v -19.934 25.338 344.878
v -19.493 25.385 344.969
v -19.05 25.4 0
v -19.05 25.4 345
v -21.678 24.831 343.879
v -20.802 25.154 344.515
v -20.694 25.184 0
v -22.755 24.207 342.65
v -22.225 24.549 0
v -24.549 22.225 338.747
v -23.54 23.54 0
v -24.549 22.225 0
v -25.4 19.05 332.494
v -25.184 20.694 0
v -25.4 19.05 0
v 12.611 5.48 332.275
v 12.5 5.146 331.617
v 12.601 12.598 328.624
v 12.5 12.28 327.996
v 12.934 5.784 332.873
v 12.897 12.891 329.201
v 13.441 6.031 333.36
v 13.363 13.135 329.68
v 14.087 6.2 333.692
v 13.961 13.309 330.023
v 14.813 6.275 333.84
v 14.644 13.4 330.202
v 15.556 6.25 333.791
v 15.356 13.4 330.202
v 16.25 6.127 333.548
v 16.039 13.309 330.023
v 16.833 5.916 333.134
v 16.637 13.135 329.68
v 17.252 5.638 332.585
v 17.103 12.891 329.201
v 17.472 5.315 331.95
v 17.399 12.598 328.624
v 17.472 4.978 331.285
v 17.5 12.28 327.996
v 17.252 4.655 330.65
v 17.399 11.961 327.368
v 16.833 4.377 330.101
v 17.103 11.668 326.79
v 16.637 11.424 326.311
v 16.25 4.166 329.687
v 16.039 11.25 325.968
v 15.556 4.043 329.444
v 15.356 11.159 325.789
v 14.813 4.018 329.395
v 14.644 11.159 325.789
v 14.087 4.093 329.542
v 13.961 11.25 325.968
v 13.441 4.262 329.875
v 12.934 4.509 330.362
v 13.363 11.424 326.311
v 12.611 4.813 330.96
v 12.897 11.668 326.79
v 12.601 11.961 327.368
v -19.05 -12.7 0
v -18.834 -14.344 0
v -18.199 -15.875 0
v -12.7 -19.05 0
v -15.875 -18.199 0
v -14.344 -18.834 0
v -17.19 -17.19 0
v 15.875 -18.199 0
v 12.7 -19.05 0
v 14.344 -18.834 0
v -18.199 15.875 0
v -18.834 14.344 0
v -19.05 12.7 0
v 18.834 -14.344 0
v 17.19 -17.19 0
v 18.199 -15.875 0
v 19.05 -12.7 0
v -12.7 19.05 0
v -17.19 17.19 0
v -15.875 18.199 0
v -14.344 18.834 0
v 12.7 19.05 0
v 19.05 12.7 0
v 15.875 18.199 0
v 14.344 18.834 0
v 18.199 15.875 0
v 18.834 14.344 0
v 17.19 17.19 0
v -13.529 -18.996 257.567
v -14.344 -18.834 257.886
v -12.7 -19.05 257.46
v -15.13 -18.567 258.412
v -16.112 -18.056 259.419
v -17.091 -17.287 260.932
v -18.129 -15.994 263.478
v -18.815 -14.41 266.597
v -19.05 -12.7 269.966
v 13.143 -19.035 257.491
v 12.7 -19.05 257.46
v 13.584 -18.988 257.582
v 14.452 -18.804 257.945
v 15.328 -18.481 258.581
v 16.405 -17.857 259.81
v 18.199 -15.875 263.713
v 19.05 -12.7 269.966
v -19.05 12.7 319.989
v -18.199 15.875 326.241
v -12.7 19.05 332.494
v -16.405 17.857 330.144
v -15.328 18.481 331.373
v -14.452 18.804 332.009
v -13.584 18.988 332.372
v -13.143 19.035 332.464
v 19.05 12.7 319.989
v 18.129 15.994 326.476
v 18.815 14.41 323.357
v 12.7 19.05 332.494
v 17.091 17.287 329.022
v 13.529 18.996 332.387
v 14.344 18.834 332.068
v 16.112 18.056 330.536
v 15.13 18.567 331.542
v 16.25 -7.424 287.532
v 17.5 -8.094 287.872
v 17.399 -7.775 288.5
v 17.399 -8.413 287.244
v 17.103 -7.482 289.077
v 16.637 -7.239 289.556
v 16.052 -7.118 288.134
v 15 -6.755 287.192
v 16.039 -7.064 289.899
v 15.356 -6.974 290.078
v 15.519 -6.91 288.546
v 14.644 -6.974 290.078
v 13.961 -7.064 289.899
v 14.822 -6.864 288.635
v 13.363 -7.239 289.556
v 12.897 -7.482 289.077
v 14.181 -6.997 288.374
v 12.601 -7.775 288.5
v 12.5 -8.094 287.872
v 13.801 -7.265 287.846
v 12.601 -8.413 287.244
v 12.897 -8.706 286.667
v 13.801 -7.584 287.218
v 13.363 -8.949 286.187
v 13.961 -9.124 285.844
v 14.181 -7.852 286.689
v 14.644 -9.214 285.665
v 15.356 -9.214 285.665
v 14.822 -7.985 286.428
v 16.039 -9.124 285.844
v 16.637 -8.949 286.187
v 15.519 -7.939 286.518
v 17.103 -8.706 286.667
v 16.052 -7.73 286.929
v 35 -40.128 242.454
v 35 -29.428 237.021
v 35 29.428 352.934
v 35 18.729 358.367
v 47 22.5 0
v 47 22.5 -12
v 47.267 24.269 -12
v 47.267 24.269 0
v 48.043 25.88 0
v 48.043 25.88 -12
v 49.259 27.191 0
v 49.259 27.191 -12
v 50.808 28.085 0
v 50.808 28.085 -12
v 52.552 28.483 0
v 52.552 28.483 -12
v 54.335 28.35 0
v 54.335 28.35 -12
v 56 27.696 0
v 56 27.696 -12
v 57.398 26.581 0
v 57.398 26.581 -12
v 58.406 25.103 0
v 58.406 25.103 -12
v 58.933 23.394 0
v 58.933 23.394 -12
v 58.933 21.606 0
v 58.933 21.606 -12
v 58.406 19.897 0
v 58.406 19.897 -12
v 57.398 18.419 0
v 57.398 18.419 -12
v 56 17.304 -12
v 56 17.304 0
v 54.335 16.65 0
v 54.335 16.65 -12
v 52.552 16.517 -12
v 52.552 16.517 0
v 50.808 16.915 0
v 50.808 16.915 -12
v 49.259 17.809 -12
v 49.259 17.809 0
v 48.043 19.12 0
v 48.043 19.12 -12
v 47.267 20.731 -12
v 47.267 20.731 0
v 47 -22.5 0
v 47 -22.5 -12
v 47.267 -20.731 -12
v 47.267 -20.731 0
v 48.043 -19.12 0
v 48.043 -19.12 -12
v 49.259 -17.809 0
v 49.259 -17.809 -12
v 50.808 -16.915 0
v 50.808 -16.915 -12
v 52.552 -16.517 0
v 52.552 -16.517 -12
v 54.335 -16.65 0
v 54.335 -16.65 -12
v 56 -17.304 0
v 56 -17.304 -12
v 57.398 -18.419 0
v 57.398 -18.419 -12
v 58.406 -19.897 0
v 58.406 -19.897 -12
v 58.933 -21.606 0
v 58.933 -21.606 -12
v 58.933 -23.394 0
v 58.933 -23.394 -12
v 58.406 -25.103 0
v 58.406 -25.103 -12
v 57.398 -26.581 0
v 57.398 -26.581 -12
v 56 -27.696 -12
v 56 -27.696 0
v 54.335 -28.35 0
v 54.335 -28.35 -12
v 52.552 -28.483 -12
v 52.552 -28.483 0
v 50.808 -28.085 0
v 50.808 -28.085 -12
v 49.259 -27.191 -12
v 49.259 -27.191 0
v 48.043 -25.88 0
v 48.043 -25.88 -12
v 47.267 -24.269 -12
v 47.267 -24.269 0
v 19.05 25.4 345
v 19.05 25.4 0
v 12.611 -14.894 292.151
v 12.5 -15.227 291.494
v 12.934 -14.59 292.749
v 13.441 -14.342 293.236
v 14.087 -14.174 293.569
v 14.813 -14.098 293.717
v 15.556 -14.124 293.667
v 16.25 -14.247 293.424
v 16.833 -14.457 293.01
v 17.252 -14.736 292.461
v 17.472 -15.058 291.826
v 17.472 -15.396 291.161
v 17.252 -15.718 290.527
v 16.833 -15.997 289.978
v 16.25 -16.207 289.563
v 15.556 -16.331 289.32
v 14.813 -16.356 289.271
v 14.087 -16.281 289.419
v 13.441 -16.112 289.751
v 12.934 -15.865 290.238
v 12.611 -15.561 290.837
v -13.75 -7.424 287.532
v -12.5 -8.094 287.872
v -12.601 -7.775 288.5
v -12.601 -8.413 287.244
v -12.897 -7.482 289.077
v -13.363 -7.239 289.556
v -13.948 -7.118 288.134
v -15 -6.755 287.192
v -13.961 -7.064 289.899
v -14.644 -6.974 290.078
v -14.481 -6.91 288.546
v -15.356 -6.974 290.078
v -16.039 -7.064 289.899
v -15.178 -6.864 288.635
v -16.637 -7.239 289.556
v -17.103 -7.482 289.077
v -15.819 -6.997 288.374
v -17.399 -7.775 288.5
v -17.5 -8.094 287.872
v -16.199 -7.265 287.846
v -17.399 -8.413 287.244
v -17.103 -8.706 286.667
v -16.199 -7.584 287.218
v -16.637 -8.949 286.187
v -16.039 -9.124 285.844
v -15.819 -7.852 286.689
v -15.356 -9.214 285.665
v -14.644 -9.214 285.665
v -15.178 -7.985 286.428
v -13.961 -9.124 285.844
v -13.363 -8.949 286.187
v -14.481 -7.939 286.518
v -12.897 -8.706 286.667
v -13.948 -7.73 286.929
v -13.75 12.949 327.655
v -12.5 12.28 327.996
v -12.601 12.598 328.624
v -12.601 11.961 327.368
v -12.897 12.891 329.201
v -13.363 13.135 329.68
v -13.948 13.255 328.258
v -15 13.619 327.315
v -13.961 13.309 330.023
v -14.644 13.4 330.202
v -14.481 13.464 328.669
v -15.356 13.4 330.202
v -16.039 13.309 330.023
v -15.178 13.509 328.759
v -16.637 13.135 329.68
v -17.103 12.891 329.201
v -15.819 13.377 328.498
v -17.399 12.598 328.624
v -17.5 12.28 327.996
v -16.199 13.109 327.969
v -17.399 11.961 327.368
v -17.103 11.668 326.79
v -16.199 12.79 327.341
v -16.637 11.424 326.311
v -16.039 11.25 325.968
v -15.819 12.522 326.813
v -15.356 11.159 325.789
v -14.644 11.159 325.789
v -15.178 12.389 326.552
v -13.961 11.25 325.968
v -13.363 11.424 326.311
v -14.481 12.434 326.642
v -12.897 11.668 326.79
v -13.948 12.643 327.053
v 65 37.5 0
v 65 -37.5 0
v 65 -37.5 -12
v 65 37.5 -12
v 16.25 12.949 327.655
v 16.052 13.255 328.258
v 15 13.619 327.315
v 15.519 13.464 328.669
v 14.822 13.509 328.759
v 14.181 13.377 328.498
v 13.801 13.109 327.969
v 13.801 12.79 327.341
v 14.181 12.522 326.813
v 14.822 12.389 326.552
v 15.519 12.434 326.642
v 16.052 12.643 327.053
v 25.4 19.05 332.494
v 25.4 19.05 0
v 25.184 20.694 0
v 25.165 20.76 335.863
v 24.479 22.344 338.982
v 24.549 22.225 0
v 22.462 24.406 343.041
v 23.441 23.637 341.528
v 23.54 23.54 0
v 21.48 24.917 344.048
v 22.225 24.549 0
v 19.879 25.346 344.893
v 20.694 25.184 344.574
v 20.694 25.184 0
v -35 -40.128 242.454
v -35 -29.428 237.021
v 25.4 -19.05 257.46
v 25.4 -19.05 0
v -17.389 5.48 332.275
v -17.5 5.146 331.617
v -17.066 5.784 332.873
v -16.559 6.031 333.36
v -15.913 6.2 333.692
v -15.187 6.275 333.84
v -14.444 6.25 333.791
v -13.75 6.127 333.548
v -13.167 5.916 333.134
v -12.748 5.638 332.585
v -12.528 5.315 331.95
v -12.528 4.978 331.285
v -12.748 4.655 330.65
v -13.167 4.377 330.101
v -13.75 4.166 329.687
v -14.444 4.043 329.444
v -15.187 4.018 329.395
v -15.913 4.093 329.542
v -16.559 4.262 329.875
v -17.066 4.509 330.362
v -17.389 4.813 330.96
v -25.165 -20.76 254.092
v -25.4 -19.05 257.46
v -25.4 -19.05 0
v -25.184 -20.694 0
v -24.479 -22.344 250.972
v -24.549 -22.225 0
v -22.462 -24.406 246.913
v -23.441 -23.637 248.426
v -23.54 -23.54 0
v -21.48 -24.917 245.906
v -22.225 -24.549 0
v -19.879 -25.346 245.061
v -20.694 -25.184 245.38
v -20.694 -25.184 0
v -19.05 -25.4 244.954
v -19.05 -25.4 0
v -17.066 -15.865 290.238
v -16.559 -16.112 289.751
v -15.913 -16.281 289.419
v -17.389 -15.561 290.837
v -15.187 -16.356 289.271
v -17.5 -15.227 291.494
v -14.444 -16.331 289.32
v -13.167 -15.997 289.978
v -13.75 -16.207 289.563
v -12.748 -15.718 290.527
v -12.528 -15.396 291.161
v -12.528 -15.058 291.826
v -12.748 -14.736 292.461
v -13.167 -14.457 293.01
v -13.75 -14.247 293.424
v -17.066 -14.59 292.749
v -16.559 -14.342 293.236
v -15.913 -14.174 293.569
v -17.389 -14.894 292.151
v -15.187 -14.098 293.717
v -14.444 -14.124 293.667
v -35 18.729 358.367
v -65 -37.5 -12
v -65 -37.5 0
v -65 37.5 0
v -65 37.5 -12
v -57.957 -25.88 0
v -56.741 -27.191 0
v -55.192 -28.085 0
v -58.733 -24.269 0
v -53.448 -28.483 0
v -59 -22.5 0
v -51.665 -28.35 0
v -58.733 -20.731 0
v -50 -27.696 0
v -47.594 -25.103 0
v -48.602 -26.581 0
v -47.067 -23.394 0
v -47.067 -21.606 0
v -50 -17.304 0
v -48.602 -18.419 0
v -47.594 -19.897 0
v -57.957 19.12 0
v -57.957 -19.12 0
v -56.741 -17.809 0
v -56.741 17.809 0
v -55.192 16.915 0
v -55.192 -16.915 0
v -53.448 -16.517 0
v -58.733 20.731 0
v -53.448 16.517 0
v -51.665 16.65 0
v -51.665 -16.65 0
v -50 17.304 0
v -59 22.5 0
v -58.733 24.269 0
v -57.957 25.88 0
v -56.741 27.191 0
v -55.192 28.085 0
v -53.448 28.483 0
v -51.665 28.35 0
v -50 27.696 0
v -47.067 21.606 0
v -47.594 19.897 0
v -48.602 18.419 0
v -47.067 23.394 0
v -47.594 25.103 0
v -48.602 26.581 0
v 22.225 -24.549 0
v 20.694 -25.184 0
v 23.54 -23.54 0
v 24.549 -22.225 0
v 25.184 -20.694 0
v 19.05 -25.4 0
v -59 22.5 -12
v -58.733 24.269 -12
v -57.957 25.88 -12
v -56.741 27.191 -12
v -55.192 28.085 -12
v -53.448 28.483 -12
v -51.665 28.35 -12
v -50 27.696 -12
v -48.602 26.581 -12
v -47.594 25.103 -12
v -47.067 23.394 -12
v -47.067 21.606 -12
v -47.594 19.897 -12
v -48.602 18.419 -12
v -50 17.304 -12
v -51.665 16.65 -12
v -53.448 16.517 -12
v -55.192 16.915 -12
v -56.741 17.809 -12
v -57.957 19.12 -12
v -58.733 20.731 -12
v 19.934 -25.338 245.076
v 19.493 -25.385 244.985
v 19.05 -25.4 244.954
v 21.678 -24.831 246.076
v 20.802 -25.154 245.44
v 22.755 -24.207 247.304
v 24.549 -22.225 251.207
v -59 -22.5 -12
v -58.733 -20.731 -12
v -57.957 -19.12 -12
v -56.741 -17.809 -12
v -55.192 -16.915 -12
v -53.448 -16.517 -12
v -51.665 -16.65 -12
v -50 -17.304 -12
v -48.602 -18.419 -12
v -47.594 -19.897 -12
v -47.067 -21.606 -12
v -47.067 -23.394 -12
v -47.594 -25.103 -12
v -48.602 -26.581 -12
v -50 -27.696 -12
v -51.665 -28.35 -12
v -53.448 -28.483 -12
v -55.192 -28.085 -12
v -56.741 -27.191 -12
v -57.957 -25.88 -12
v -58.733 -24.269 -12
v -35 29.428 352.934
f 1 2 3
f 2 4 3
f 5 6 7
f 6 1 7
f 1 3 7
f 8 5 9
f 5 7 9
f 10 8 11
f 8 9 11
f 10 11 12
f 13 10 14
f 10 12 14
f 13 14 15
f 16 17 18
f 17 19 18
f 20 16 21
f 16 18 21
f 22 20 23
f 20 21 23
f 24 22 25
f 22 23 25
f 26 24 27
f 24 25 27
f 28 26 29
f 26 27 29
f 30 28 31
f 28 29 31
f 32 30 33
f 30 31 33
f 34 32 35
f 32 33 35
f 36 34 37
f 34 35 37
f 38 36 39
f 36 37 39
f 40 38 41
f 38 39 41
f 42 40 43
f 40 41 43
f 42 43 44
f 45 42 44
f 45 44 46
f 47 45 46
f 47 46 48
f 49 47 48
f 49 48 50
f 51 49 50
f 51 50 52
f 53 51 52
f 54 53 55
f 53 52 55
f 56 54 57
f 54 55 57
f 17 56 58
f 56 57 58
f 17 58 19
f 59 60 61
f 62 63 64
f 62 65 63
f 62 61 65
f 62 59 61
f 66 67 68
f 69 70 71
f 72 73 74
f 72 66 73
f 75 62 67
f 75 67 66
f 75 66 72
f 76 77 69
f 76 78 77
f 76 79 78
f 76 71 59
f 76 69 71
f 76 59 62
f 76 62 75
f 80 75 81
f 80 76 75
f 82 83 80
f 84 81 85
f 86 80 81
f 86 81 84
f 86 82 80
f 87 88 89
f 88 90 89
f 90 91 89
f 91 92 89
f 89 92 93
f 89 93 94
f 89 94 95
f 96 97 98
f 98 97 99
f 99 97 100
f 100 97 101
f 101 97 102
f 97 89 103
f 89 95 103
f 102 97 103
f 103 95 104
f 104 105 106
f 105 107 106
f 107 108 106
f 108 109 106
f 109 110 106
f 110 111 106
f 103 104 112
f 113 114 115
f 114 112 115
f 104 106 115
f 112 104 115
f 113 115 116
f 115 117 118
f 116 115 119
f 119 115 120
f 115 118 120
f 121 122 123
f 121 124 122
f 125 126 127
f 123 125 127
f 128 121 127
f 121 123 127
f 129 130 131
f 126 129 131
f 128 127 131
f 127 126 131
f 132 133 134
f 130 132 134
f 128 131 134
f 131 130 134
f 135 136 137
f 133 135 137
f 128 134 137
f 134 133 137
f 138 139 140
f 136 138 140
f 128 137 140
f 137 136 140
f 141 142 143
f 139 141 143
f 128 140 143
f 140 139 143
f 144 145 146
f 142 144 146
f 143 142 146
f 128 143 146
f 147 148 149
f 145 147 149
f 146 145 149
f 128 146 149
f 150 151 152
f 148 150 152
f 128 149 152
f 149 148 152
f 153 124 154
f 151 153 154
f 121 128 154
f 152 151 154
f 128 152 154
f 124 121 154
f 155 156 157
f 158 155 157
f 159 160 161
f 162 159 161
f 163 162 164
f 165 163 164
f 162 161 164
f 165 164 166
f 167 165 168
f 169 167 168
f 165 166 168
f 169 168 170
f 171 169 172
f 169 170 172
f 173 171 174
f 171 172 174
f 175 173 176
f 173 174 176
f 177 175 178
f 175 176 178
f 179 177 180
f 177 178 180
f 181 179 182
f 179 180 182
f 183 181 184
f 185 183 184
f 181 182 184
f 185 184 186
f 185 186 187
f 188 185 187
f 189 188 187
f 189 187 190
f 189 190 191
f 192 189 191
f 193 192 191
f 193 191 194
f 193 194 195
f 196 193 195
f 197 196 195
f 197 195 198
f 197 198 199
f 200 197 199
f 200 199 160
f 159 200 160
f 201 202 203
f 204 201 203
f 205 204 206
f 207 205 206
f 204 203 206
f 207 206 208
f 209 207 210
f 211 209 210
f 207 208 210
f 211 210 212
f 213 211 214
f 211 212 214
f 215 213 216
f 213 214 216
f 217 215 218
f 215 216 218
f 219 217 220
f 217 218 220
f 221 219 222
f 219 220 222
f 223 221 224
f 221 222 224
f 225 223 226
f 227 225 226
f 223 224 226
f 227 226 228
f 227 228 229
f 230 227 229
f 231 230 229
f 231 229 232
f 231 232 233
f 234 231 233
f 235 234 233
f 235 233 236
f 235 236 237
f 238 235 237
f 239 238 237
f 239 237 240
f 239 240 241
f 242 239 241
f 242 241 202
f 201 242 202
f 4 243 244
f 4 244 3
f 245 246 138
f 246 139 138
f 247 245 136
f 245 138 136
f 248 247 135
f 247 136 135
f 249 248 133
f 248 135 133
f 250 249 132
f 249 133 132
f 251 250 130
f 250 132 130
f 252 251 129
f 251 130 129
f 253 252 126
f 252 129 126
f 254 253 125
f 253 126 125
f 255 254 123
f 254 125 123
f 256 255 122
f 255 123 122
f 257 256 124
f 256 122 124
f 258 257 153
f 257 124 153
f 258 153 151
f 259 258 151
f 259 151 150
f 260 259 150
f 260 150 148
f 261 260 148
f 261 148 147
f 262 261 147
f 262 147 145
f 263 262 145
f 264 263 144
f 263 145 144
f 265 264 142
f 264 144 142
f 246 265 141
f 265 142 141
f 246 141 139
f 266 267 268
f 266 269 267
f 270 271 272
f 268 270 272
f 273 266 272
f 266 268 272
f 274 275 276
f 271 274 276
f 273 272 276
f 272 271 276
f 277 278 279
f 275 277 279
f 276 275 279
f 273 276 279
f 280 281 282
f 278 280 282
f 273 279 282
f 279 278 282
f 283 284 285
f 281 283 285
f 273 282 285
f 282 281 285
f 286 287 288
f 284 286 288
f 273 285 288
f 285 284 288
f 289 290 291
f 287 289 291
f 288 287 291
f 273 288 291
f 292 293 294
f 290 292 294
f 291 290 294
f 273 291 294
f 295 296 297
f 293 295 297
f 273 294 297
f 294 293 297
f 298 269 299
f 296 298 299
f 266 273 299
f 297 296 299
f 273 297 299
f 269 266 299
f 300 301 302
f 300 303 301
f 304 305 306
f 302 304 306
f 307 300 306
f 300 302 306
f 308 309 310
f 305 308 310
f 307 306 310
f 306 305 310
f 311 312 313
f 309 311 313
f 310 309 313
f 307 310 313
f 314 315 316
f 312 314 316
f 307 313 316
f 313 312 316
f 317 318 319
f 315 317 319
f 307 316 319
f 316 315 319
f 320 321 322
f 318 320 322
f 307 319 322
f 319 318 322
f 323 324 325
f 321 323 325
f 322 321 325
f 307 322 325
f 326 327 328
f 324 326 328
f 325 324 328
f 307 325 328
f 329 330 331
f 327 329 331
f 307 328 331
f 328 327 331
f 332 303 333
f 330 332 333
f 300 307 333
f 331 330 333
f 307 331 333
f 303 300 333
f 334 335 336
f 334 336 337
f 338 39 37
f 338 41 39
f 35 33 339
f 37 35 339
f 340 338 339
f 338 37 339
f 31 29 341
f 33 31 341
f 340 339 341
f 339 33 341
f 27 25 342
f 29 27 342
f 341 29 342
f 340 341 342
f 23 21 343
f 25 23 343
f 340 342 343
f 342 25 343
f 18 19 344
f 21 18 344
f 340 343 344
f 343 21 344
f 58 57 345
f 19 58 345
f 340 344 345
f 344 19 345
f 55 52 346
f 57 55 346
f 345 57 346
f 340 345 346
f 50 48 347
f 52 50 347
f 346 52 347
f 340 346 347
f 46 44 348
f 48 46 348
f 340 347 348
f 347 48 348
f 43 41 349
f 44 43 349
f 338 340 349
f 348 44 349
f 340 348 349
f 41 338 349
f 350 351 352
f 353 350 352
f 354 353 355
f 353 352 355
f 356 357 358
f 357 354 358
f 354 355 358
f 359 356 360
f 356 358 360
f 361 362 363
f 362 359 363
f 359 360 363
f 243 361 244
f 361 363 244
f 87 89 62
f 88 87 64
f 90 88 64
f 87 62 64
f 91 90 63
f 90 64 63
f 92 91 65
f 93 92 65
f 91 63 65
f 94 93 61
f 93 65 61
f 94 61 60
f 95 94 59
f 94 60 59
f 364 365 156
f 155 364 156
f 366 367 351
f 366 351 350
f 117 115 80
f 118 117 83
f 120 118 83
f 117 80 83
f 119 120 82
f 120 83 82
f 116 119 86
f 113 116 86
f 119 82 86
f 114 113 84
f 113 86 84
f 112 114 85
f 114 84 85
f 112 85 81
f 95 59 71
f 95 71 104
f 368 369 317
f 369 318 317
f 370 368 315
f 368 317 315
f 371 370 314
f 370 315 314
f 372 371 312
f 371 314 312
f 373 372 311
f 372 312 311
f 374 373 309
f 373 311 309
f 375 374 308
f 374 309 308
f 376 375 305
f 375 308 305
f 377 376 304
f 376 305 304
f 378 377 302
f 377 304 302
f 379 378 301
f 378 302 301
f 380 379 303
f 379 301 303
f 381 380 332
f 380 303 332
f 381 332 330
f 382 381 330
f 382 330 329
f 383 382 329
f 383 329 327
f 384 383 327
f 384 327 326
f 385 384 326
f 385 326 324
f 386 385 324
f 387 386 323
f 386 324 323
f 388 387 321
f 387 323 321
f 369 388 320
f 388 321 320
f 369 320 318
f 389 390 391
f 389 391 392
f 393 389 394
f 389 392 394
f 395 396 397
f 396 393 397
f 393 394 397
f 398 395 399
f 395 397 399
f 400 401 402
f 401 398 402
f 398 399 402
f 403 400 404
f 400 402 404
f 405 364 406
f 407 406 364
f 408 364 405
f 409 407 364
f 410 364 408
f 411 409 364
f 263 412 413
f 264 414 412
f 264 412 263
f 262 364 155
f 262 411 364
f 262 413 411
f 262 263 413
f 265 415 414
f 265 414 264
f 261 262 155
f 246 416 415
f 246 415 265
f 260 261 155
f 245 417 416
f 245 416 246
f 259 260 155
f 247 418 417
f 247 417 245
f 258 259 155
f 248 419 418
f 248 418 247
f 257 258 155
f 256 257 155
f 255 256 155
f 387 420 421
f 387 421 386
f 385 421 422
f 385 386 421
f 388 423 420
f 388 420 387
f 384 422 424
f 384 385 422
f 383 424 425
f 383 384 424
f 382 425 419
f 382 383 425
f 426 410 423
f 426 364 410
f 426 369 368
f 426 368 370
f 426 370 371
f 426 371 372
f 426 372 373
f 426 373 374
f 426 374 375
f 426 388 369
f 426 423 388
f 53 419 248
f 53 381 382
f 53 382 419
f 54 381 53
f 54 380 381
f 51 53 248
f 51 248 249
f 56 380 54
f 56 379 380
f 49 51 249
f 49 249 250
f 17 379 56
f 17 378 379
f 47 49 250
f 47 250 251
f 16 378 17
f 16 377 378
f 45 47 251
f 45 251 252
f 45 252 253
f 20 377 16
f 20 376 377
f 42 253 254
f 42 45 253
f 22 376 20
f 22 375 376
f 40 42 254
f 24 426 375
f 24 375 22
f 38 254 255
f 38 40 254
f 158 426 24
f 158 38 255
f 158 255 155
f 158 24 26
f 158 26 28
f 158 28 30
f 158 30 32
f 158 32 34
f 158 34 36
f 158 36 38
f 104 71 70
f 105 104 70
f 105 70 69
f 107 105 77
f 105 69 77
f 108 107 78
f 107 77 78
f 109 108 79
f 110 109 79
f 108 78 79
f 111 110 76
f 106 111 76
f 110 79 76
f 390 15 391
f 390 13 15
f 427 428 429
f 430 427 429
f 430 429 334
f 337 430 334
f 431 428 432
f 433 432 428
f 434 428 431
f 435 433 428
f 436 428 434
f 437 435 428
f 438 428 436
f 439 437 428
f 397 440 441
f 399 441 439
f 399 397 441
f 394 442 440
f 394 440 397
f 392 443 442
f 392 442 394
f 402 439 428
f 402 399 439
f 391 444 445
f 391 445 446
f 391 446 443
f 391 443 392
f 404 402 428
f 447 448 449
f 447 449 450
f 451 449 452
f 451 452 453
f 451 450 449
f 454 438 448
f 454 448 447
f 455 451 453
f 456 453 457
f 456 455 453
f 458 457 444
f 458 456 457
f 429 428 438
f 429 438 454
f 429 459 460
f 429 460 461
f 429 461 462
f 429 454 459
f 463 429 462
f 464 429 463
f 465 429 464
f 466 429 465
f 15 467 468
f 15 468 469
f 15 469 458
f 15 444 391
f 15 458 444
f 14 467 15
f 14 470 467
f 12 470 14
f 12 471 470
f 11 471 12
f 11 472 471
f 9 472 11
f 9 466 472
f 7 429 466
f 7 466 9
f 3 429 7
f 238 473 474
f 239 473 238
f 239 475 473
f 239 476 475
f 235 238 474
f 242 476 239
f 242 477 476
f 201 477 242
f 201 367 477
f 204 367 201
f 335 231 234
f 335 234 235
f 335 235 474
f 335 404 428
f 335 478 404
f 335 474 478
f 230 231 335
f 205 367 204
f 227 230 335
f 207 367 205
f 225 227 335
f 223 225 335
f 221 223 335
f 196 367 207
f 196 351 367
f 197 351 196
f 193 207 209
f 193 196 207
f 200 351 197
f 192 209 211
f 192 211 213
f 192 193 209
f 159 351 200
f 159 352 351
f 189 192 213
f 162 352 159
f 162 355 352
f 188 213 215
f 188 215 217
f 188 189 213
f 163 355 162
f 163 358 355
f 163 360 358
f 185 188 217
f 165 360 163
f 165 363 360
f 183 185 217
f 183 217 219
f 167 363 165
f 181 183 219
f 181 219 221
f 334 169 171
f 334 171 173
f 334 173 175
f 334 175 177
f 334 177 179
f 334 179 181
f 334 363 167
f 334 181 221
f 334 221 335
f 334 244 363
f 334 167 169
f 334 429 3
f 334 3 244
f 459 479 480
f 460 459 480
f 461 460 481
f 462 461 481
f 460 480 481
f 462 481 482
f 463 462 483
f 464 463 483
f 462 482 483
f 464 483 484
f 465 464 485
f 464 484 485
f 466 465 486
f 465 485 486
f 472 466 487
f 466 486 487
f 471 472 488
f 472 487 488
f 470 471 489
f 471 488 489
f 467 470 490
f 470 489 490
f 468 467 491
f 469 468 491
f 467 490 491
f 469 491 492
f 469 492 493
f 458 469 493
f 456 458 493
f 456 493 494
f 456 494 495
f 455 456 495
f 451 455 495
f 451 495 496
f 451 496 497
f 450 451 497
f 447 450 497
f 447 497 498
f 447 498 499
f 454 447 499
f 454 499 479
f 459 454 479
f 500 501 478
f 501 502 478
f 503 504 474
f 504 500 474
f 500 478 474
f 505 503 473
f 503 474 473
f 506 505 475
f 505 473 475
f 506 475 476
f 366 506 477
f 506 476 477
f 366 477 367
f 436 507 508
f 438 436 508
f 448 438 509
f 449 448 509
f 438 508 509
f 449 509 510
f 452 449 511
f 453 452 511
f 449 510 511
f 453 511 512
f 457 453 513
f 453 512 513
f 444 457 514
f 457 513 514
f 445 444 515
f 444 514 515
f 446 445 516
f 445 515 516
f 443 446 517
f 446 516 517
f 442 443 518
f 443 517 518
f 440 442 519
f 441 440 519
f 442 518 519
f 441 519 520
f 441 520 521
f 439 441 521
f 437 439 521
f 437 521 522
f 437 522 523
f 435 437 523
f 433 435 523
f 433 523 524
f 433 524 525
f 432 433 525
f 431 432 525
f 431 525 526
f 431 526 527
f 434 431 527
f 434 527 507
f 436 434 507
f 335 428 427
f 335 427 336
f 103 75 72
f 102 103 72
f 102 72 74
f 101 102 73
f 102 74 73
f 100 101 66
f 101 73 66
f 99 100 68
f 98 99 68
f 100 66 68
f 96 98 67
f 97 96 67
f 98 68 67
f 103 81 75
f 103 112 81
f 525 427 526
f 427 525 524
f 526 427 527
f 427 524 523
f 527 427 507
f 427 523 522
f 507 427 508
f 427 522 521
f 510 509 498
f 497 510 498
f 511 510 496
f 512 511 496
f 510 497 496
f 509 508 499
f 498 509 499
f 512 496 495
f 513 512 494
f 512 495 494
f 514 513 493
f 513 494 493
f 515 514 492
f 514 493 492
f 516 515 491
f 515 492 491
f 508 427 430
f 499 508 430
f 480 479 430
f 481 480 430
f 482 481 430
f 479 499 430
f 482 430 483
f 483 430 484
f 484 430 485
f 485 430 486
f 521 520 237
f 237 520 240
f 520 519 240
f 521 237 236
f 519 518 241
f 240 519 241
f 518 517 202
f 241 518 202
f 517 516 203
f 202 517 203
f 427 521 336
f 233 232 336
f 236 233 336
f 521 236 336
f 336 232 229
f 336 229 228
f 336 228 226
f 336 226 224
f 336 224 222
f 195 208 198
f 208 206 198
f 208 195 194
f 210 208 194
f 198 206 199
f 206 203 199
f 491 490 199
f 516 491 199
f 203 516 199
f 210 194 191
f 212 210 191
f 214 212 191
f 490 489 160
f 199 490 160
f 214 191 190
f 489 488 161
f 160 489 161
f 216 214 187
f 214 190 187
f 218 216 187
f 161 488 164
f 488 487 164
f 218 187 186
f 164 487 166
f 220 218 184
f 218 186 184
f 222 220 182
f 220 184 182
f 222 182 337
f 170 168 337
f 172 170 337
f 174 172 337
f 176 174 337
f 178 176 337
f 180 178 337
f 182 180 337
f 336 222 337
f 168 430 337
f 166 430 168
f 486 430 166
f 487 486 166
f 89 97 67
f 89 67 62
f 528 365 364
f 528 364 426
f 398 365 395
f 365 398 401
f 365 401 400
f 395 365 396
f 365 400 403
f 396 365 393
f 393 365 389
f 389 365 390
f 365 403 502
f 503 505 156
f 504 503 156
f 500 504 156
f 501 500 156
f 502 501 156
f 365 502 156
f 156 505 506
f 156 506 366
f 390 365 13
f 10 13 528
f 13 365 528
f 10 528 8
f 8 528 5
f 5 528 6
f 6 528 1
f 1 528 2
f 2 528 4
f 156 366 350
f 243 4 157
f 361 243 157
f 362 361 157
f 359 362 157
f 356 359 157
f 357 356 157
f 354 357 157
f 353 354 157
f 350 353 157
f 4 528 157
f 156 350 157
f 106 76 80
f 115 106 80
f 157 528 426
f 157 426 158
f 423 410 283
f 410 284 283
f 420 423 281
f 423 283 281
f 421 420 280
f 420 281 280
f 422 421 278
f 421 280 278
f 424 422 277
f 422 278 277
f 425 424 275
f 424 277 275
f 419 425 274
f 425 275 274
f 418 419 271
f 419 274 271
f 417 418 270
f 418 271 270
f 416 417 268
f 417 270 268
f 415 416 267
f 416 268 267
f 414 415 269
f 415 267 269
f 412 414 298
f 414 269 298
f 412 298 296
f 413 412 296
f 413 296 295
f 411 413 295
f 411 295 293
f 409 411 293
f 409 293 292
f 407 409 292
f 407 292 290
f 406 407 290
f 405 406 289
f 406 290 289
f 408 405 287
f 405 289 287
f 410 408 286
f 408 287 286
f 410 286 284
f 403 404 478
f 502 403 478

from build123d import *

# Parameters (mm, degrees)
F0_W      = 130
F0_H      = 75
F1_DEPTH  = 12
F3_DEPTH  = 345
F5_D      = 12
F7_DEPTH  = 50.8
F8_W      = 70
F8_H      = 130
F9_DEPTH  = 12
F11_D     = 5
F11_DEPTH = 8
F11_TIP   = 1.5021515476


with BuildPart() as f1:
    # F0 (on Top) → F1 (new body)
    with BuildSketch(Plane.XY):
        Rectangle(F0_W, F0_H)
    extrude(amount=-F1_DEPTH)

    # F2 (on face) → F3 (join)
    with BuildSketch(Plane.XY):
        with BuildLine():
            Line((-19.05, -25.4), (19.05, -25.4))
            ThreePointArc((19.05, -25.4), (23.5401280605, -23.5401280605), (25.4, -19.05))
            Line((25.4, -19.05), (25.4, 19.05))
            ThreePointArc((25.4, 19.05), (23.5401280605, 23.5401280605), (19.05, 25.4))
            Line((19.05, 25.4), (-19.05, 25.4))
            ThreePointArc((-19.05, 25.4), (-23.5401280605, 23.5401280605), (-25.4, 19.05))
            Line((-25.4, 19.05), (-25.4, -19.05))
            ThreePointArc((-25.4, -19.05), (-23.5401280605, -23.5401280605), (-19.05, -25.4))
        make_face()
        with BuildLine():
            Line((-12.7, 19.05), (12.7, 19.05))
            ThreePointArc((12.7, 19.05), (17.1901280605, 17.1901280605), (19.05, 12.7))
            Line((19.05, 12.7), (19.05, -12.7))
            ThreePointArc((19.05, -12.7), (17.1901280605, -17.1901280605), (12.7, -19.05))
            Line((12.7, -19.05), (-12.7, -19.05))
            ThreePointArc((-12.7, -19.05), (-17.1901280605, -17.1901280605), (-19.05, -12.7))
            Line((-19.05, -12.7), (-19.05, 12.7))
            ThreePointArc((-19.05, 12.7), (-17.1901280605, 17.1901280605), (-12.7, 19.05))
        make_face(mode=Mode.SUBTRACT)
    extrude(amount=F3_DEPTH)

    # F5 (through all)
    with Locations(Plane.XY):
        with Locations((-53, 22.5), (53, 22.5), (53, -22.5), (-53, -22.5)):
            Hole(F5_D / 2)

    # F6 (on face) → F7 (cut)
    with BuildSketch(Plane.YZ.offset(25.4)):
        Polygon((-19.05, 345), (-25.4, 345), (-25.4, 244.9542985566), (-19.05, 257.460011237), align=None)
        Polygon((19.05, 345), (-19.05, 345), (-19.05, 257.460011237), (19.05, 332.4942873196), align=None)
        Polygon((25.4, 345), (19.05, 345), (19.05, 332.4942873196), align=None)
    extrude(amount=-F7_DEPTH, mode=Mode.SUBTRACT)

    # F8 (on face) → F9 (join)
    with BuildSketch(Plane(origin=(0, -119.0782097883, 60.4640976071), x_dir=(1, 0, 0), z_dir=(0, -0.8916395458, 0.4527459778))):
        with Locations((0, 263.0132913952)):
            Rectangle(F8_W, F8_H)
        with BuildLine():
            Line((25.4, 305.0898661941), (25.4, 220.9367165963))
            add(Edge.make_bspline(
                [(25.4, 220.9367165963), (25.4, 206.9111916633), (19.05, 206.9111916633)],
                knots=[4.7123889804, 4.7123889804, 4.7123889804, 6.2831853072, 6.2831853072, 6.2831853072], degree=2, weights=[1, 0.7071067812, 1]))
            Line((19.05, 206.9111916633), (-19.05, 206.9111916633))
            add(Edge.make_bspline(
                [(-19.05, 206.9111916633), (-25.4, 206.9111916633), (-25.4, 220.9367165963)],
                knots=[0, 0, 0, 1.5707963268, 1.5707963268, 1.5707963268], degree=2, weights=[1, 0.7071067812, 1]))
            Line((-25.4, 220.9367165963), (-25.4, 305.0898661941))
            add(Edge.make_bspline(
                [(-25.4, 305.0898661941), (-25.4, 319.115391127), (-19.05, 319.115391127)],
                knots=[1.5707963268, 1.5707963268, 1.5707963268, 3.1415926536, 3.1415926536, 3.1415926536], degree=2, weights=[1, 0.7071067812, 1]))
            Line((-19.05, 319.115391127), (19.05, 319.115391127))
            add(Edge.make_bspline(
                [(19.05, 319.115391127), (25.4, 319.115391127), (25.4, 305.0898661941)],
                knots=[3.1415926536, 3.1415926536, 3.1415926536, 4.7123889804, 4.7123889804, 4.7123889804], degree=2, weights=[1, 0.7071067812, 1]))
        make_face(mode=Mode.SUBTRACT)
        with BuildLine():
            add(Edge.make_bspline(
                [(25.4, 220.9367165963), (25.4, 206.9111916633), (19.05, 206.9111916633)],
                knots=[4.7123889804, 4.7123889804, 4.7123889804, 6.2831853072, 6.2831853072, 6.2831853072], degree=2, weights=[1, 0.7071067812, 1]))
            Line((25.4, 220.9367165963), (25.4, 305.0898661941))
            add(Edge.make_bspline(
                [(19.05, 319.115391127), (25.4, 319.115391127), (25.4, 305.0898661941)],
                knots=[3.1415926536, 3.1415926536, 3.1415926536, 4.7123889804, 4.7123889804, 4.7123889804], degree=2, weights=[1, 0.7071067812, 1]))
            Line((19.05, 319.115391127), (-19.05, 319.115391127))
            add(Edge.make_bspline(
                [(-25.4, 305.0898661941), (-25.4, 319.115391127), (-19.05, 319.115391127)],
                knots=[1.5707963268, 1.5707963268, 1.5707963268, 3.1415926536, 3.1415926536, 3.1415926536], degree=2, weights=[1, 0.7071067812, 1]))
            Line((-25.4, 305.0898661941), (-25.4, 220.9367165963))
            add(Edge.make_bspline(
                [(-19.05, 206.9111916633), (-25.4, 206.9111916633), (-25.4, 220.9367165963)],
                knots=[0, 0, 0, 1.5707963268, 1.5707963268, 1.5707963268], degree=2, weights=[1, 0.7071067812, 1]))
            Line((-19.05, 206.9111916633), (19.05, 206.9111916633))
        make_face()
        with BuildLine():
            Line((-19.05, 234.9622415292), (-19.05, 291.0643412611))
            add(Edge.make_bspline(
                [(-19.05, 291.0643412611), (-19.05, 305.0898661941), (-12.7, 305.0898661941)],
                knots=[1.5707963268, 1.5707963268, 1.5707963268, 3.1415926536, 3.1415926536, 3.1415926536], degree=2, weights=[1, 0.7071067812, 1]))
            Line((-12.7, 305.0898661941), (12.7, 305.0898661941))
            add(Edge.make_bspline(
                [(12.7, 305.0898661941), (19.05, 305.0898661941), (19.05, 291.0643412611)],
                knots=[3.1415926536, 3.1415926536, 3.1415926536, 4.7123889804, 4.7123889804, 4.7123889804], degree=2, weights=[1, 0.7071067812, 1]))
            Line((19.05, 291.0643412611), (19.05, 234.9622415292))
            add(Edge.make_bspline(
                [(19.05, 234.9622415292), (19.05, 220.9367165963), (12.7, 220.9367165963)],
                knots=[4.7123889804, 4.7123889804, 4.7123889804, 6.2831853072, 6.2831853072, 6.2831853072], degree=2, weights=[1, 0.7071067812, 1]))
            Line((12.7, 220.9367165963), (-12.7, 220.9367165963))
            add(Edge.make_bspline(
                [(-12.7, 220.9367165963), (-19.05, 220.9367165963), (-19.05, 234.9622415292)],
                knots=[0, 0, 0, 1.5707963268, 1.5707963268, 1.5707963268], degree=2, weights=[1, 0.7071067812, 1]))
        make_face(mode=Mode.SUBTRACT)
        with BuildLine():
            add(Edge.make_bspline(
                [(-19.05, 291.0643412611), (-19.05, 305.0898661941), (-12.7, 305.0898661941)],
                knots=[1.5707963268, 1.5707963268, 1.5707963268, 3.1415926536, 3.1415926536, 3.1415926536], degree=2, weights=[1, 0.7071067812, 1]))
            Line((-19.05, 291.0643412611), (-19.05, 234.9622415292))
            add(Edge.make_bspline(
                [(-12.7, 220.9367165963), (-19.05, 220.9367165963), (-19.05, 234.9622415292)],
                knots=[0, 0, 0, 1.5707963268, 1.5707963268, 1.5707963268], degree=2, weights=[1, 0.7071067812, 1]))
            Line((-12.7, 220.9367165963), (12.7, 220.9367165963))
            add(Edge.make_bspline(
                [(19.05, 234.9622415292), (19.05, 220.9367165963), (12.7, 220.9367165963)],
                knots=[4.7123889804, 4.7123889804, 4.7123889804, 6.2831853072, 6.2831853072, 6.2831853072], degree=2, weights=[1, 0.7071067812, 1]))
            Line((19.05, 234.9622415292), (19.05, 291.0643412611))
            add(Edge.make_bspline(
                [(12.7, 305.0898661941), (19.05, 305.0898661941), (19.05, 291.0643412611)],
                knots=[3.1415926536, 3.1415926536, 3.1415926536, 4.7123889804, 4.7123889804, 4.7123889804], degree=2, weights=[1, 0.7071067812, 1]))
            Line((12.7, 305.0898661941), (-12.7, 305.0898661941))
        make_face()
    extrude(amount=F9_DEPTH)

    # F11
    with Locations(Plane(origin=(0, -129.7778843376, 65.8970493408), x_dir=(1, 0, 0), z_dir=(0, -0.8916395458, 0.4527459778))):
        with Locations((15, 298.0132913952), (15, 253.0132913952), (-15, 253.0132913952), (-15, 298.0132913952)):
            Hole(F11_D / 2, depth=F11_DEPTH)
            with Locations((0, 0, -(F11_DEPTH + F11_TIP / 2))):  # 118° drill point
                Cone(0, F11_D / 2, F11_TIP, mode=Mode.SUBTRACT)


solid = f1.part
